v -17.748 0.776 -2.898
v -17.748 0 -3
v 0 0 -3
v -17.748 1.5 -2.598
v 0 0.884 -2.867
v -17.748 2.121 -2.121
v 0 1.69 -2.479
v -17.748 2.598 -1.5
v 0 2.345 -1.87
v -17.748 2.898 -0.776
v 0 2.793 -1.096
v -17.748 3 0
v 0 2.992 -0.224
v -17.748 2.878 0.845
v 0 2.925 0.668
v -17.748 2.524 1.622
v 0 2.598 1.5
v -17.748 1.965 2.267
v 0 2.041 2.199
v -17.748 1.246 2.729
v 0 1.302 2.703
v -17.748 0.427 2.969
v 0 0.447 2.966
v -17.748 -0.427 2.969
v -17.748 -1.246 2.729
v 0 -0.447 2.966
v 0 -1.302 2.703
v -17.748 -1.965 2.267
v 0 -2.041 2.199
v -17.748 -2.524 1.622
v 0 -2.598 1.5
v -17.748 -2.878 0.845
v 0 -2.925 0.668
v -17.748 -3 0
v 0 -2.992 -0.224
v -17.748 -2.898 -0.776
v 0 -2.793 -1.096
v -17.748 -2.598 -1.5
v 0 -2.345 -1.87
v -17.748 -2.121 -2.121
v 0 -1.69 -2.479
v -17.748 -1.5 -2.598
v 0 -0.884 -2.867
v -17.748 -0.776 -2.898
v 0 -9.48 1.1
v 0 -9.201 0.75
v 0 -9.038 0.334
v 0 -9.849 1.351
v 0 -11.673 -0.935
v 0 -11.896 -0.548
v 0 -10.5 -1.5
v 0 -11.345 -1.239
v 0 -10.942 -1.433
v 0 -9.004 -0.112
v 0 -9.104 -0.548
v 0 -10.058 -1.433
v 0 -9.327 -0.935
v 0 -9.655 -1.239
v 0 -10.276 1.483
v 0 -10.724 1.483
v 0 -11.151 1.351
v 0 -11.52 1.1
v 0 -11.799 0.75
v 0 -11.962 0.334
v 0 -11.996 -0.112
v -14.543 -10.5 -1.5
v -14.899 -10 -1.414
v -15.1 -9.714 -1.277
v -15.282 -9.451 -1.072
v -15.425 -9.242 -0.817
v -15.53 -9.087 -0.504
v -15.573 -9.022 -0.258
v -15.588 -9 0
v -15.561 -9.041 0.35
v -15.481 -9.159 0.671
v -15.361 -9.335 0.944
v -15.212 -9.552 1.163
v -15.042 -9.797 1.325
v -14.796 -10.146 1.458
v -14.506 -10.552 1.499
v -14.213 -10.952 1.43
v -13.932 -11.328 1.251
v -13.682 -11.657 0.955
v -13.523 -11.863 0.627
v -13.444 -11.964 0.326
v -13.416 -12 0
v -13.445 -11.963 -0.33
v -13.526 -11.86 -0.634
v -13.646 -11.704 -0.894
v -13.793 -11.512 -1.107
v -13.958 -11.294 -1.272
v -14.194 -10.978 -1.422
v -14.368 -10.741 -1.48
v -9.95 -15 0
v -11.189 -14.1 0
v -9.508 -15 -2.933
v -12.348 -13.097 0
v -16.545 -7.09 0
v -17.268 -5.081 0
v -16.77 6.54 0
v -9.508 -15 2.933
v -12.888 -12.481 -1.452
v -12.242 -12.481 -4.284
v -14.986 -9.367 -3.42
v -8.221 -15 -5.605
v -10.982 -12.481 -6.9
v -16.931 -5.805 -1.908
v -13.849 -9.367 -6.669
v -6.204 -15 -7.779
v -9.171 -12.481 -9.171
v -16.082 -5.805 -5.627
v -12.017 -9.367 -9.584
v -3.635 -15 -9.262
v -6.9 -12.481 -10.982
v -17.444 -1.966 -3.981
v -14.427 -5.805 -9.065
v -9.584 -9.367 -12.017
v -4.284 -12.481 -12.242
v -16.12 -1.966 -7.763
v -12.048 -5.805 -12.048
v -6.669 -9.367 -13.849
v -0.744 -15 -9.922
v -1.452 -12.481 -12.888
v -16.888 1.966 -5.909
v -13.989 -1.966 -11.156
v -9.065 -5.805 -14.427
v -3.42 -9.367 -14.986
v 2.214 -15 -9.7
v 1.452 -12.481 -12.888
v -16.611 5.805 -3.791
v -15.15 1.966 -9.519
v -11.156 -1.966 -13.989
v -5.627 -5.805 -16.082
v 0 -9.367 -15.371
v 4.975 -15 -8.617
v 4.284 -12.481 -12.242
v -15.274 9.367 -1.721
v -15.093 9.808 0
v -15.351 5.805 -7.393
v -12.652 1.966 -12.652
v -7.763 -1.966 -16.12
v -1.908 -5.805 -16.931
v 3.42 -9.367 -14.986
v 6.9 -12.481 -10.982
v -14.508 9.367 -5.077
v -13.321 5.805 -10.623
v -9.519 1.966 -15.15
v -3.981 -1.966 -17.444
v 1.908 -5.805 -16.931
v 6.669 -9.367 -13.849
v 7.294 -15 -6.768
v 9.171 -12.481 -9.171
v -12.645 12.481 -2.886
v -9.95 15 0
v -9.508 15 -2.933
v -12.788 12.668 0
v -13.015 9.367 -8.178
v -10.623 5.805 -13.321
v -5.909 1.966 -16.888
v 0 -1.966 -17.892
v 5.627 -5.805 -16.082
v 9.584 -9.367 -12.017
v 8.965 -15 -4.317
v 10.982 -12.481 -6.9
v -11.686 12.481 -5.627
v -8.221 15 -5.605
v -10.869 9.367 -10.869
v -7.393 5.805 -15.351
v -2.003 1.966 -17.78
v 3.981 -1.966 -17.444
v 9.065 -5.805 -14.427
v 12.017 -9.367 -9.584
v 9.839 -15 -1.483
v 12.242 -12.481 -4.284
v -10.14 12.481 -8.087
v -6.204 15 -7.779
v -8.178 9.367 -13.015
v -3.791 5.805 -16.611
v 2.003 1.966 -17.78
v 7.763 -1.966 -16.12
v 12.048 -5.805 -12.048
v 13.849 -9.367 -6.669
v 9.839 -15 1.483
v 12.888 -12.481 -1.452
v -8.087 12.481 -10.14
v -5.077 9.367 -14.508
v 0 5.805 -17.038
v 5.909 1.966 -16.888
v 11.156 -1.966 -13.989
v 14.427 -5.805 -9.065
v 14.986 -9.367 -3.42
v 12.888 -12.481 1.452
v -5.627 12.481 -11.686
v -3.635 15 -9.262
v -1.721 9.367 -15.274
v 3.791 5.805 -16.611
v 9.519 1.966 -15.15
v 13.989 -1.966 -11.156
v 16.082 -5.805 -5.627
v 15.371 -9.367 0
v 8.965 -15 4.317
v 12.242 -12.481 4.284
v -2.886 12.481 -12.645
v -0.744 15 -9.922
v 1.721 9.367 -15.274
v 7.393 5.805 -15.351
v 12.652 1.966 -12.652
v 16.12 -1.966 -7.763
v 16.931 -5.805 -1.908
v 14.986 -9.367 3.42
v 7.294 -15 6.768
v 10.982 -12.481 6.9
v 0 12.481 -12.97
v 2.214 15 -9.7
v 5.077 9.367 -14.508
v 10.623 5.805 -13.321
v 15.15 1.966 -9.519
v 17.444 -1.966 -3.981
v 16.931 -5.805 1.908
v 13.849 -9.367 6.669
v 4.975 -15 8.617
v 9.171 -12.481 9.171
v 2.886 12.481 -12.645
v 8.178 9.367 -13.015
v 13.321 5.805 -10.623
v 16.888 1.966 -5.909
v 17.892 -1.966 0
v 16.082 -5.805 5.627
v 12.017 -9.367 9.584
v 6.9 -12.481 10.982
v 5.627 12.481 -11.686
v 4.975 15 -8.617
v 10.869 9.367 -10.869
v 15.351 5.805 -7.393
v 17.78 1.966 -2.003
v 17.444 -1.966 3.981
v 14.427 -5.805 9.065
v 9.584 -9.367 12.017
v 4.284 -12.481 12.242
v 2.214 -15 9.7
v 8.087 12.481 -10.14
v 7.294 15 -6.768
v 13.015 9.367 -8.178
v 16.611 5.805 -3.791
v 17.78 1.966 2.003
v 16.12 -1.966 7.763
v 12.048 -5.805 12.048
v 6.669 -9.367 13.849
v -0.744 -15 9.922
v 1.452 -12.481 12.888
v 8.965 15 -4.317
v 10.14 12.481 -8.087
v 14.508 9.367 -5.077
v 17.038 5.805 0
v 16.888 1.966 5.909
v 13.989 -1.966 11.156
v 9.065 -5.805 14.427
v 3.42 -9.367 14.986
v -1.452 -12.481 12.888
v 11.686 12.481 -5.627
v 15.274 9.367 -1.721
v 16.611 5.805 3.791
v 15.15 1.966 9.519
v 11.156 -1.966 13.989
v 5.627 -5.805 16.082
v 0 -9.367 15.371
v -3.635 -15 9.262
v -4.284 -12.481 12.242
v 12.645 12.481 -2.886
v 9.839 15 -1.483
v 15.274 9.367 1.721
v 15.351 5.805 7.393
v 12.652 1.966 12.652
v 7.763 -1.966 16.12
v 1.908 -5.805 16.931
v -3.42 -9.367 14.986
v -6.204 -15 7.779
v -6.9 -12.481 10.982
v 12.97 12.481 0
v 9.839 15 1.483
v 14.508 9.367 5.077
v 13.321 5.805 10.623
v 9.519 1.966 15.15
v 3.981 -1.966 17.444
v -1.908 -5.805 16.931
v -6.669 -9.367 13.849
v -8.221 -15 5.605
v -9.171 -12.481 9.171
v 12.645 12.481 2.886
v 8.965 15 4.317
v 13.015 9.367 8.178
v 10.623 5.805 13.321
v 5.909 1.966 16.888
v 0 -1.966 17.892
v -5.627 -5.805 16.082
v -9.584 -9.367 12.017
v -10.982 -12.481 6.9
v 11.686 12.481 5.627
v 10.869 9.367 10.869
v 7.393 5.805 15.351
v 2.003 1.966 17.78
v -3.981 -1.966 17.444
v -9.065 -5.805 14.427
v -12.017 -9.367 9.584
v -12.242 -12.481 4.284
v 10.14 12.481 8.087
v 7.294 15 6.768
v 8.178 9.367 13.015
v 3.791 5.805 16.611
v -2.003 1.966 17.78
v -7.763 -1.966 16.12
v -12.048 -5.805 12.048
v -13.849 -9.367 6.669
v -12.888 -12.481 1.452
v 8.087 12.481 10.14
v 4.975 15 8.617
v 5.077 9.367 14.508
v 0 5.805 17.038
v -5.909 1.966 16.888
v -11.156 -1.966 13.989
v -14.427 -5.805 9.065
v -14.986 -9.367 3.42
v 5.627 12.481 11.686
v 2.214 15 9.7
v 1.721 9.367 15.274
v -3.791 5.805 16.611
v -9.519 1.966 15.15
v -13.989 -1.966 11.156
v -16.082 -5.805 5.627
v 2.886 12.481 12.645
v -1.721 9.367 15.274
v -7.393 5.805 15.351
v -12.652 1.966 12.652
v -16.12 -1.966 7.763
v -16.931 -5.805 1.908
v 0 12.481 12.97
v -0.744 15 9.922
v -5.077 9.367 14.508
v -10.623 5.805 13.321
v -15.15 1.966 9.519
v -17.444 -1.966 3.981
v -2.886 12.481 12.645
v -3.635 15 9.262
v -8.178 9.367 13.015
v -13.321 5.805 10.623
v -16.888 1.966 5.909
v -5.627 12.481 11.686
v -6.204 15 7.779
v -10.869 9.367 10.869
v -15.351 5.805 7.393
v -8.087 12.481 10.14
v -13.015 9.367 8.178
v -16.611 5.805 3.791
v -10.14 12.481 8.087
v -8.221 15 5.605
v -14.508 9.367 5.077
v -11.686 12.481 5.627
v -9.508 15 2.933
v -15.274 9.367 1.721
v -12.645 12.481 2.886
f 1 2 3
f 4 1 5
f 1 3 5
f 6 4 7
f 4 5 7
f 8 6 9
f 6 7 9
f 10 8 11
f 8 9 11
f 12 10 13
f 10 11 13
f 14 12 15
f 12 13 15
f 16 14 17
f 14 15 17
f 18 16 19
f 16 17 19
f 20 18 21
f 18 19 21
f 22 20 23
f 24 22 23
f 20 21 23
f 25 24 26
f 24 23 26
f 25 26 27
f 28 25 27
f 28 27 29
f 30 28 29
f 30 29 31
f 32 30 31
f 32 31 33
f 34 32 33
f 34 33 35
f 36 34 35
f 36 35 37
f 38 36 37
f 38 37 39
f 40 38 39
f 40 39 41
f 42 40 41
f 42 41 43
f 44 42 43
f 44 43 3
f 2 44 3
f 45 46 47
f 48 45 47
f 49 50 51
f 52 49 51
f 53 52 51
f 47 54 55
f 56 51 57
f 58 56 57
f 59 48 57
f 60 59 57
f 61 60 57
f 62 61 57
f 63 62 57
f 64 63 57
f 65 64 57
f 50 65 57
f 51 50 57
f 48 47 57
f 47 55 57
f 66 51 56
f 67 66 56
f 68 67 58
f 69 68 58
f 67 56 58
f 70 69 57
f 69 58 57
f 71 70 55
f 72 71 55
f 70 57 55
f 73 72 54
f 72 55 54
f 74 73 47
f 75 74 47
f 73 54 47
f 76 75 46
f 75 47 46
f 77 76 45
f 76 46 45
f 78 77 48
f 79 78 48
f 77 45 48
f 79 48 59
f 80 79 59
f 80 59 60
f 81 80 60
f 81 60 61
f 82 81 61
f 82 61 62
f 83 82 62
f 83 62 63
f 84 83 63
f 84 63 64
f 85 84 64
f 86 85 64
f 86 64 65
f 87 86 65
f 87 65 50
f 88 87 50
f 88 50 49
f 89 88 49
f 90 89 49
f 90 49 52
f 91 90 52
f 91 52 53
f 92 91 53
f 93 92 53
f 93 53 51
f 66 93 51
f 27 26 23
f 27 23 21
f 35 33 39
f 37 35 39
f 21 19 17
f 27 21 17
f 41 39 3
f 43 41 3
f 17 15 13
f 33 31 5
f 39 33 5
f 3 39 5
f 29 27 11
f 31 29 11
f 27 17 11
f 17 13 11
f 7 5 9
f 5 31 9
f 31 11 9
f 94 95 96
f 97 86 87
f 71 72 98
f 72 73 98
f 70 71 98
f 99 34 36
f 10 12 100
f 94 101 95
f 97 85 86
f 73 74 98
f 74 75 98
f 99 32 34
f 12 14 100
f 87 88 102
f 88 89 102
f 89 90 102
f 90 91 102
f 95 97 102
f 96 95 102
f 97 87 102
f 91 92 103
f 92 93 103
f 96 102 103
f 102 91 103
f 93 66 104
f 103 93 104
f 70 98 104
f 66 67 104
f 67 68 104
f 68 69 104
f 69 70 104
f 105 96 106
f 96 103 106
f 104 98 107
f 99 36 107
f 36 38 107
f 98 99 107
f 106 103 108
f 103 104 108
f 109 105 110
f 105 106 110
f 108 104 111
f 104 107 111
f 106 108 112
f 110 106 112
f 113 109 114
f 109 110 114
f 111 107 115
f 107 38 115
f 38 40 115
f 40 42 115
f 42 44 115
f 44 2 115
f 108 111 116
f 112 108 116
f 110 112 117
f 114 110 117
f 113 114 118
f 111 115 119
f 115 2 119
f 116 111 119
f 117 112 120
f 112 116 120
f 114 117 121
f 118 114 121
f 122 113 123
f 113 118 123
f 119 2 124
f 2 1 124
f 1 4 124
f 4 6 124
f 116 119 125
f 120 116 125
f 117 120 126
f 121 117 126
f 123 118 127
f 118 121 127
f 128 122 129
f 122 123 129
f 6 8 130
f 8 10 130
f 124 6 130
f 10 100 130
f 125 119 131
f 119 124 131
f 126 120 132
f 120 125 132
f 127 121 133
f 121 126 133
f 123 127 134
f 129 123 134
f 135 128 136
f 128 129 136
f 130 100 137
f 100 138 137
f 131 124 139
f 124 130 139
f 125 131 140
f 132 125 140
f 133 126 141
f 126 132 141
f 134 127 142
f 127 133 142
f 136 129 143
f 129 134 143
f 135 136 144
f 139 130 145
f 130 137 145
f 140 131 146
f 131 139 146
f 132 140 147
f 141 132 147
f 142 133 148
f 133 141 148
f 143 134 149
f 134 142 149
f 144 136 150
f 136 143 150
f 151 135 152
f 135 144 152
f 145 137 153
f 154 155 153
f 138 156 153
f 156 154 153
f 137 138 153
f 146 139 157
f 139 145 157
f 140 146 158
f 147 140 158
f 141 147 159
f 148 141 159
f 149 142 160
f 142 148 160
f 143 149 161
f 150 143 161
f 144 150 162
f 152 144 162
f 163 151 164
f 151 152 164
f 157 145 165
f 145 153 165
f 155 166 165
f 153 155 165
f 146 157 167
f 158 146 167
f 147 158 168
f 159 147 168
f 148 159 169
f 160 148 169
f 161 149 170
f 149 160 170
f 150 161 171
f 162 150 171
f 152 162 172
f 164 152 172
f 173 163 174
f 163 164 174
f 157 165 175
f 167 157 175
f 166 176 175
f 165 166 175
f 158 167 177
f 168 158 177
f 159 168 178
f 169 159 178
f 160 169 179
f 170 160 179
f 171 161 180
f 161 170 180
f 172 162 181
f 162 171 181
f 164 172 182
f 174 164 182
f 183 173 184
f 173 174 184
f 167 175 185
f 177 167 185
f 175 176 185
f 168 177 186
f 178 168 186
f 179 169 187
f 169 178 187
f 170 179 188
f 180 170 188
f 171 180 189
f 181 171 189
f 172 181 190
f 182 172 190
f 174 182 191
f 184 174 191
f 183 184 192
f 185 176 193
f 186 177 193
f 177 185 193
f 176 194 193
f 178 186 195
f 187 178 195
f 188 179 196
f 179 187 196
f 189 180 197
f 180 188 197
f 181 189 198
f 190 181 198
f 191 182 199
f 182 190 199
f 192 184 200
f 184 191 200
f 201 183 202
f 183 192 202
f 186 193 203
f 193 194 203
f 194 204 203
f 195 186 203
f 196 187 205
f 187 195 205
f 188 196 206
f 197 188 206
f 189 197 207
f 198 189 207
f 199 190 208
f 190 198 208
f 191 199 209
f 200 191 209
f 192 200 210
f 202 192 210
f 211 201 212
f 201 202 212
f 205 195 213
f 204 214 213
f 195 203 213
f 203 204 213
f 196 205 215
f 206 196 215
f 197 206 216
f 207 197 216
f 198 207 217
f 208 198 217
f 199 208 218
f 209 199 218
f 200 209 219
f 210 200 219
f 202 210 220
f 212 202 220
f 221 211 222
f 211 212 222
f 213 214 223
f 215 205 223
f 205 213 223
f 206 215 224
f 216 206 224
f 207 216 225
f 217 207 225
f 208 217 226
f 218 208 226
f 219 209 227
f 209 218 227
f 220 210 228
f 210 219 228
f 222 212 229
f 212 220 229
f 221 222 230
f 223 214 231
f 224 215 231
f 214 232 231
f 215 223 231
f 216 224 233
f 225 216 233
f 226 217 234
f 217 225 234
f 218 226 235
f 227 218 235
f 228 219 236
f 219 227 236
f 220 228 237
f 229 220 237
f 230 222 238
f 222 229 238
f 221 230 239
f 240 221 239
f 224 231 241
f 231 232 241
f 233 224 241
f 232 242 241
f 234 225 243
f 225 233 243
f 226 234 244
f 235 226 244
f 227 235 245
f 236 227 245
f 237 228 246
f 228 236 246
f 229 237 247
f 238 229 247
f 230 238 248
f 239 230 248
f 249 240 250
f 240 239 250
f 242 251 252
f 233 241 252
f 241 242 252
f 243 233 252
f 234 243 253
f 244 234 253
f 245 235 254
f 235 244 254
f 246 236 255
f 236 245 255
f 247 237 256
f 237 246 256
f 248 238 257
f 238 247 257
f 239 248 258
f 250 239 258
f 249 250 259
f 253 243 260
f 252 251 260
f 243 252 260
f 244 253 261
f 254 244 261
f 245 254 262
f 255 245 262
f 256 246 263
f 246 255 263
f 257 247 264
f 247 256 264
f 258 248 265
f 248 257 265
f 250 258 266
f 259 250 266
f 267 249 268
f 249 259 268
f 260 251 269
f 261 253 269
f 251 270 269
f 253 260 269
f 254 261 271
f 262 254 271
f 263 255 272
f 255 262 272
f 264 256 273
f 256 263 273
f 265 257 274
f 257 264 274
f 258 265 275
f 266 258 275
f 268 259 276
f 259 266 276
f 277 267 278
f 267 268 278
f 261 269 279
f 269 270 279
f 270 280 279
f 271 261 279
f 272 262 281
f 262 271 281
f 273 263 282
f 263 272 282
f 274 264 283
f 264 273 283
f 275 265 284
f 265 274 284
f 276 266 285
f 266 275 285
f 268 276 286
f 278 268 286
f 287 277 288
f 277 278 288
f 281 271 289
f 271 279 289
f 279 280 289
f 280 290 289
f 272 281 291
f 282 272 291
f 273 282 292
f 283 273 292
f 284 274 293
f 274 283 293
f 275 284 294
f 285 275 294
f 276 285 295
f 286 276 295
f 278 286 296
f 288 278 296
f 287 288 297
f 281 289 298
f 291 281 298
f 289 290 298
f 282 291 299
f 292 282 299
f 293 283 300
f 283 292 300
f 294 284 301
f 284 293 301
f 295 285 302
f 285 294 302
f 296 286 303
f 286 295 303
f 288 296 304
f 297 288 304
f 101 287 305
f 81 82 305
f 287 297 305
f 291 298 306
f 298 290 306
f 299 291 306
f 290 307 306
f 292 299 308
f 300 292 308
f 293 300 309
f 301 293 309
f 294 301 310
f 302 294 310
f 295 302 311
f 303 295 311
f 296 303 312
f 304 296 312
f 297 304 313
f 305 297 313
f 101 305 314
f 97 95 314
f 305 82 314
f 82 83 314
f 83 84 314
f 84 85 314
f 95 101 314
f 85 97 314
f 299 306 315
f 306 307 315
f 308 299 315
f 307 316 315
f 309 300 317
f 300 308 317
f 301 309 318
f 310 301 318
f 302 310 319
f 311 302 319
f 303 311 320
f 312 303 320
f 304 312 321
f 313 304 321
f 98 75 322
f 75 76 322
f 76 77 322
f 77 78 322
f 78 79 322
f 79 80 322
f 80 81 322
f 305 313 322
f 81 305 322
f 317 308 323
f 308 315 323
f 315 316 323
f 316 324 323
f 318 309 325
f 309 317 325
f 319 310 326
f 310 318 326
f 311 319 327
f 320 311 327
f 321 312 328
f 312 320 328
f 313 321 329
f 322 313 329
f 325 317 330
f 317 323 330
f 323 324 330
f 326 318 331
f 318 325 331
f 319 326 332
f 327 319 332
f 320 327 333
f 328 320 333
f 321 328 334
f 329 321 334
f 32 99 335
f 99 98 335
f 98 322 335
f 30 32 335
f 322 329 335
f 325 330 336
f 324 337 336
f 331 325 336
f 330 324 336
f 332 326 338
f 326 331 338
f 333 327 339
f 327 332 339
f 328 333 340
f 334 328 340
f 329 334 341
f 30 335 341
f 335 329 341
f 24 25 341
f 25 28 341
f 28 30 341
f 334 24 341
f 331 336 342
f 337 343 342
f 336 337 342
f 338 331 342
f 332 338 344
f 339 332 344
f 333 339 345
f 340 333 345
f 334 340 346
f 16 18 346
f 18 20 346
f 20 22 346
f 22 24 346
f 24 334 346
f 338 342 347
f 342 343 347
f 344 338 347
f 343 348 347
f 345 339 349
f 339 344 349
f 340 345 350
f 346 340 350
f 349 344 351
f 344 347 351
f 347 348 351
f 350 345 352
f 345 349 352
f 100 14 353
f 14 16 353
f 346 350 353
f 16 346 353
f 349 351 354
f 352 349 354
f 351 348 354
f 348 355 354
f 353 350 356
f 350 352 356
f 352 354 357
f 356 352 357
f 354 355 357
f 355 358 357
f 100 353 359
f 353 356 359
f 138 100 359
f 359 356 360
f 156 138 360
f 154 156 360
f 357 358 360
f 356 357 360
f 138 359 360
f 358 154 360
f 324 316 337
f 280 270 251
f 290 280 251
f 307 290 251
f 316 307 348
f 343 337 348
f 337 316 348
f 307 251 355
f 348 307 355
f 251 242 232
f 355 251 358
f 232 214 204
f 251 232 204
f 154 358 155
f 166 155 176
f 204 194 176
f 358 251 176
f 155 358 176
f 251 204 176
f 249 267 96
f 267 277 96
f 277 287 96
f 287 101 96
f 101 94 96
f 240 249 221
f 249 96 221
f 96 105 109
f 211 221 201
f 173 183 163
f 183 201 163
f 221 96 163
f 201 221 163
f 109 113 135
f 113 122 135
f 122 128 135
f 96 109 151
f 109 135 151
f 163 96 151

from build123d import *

# Parameters (mm, degrees)
ESQUISSE2_R             = 3
ENL_V_MAT_EXTRU_1_DEPTH = 30.546573405
ESQUISSE3_R             = 1.5
ENL_V_MAT_EXTRU_2_DEPTH = 30.54657341


with BuildPart() as part:
    # Esquisse1 → Révolution1 (revolve)
    with BuildSketch(Plane.XY):
        with BuildLine():
            Line((0, 15), (0, -15))
            Line((0, -15), (-9.949874371, -15))
            ThreePointArc((-9.949874371, -15), (-18, 0), (-9.949874371, 15))
            Line((-9.949874371, 15), (0, 15))
        make_face()
    revolve(axis=Axis((0, 15, 0), (0, -1, 0)))

    # Esquisse2 → Enlèv. mat.-Extru.1 (cut, through all)
    with BuildSketch(Plane(origin=(0, 0, 0), x_dir=(0, 0, -1), z_dir=(1, 0, 0))):
        Circle(ESQUISSE2_R)
    extrude(amount=-ENL_V_MAT_EXTRU_1_DEPTH, mode=Mode.SUBTRACT)

    # Esquisse3 → Enlèv. mat.-Extru.2 (cut, through all)
    with BuildSketch(Plane(origin=(0, 0, 0), x_dir=(0, 0, -1), z_dir=(1, 0, 0))):
        with Locations((0, -10.5)):
            Circle(ESQUISSE3_R)
    extrude(amount=-ENL_V_MAT_EXTRU_2_DEPTH, mode=Mode.SUBTRACT)


solid = part.part
